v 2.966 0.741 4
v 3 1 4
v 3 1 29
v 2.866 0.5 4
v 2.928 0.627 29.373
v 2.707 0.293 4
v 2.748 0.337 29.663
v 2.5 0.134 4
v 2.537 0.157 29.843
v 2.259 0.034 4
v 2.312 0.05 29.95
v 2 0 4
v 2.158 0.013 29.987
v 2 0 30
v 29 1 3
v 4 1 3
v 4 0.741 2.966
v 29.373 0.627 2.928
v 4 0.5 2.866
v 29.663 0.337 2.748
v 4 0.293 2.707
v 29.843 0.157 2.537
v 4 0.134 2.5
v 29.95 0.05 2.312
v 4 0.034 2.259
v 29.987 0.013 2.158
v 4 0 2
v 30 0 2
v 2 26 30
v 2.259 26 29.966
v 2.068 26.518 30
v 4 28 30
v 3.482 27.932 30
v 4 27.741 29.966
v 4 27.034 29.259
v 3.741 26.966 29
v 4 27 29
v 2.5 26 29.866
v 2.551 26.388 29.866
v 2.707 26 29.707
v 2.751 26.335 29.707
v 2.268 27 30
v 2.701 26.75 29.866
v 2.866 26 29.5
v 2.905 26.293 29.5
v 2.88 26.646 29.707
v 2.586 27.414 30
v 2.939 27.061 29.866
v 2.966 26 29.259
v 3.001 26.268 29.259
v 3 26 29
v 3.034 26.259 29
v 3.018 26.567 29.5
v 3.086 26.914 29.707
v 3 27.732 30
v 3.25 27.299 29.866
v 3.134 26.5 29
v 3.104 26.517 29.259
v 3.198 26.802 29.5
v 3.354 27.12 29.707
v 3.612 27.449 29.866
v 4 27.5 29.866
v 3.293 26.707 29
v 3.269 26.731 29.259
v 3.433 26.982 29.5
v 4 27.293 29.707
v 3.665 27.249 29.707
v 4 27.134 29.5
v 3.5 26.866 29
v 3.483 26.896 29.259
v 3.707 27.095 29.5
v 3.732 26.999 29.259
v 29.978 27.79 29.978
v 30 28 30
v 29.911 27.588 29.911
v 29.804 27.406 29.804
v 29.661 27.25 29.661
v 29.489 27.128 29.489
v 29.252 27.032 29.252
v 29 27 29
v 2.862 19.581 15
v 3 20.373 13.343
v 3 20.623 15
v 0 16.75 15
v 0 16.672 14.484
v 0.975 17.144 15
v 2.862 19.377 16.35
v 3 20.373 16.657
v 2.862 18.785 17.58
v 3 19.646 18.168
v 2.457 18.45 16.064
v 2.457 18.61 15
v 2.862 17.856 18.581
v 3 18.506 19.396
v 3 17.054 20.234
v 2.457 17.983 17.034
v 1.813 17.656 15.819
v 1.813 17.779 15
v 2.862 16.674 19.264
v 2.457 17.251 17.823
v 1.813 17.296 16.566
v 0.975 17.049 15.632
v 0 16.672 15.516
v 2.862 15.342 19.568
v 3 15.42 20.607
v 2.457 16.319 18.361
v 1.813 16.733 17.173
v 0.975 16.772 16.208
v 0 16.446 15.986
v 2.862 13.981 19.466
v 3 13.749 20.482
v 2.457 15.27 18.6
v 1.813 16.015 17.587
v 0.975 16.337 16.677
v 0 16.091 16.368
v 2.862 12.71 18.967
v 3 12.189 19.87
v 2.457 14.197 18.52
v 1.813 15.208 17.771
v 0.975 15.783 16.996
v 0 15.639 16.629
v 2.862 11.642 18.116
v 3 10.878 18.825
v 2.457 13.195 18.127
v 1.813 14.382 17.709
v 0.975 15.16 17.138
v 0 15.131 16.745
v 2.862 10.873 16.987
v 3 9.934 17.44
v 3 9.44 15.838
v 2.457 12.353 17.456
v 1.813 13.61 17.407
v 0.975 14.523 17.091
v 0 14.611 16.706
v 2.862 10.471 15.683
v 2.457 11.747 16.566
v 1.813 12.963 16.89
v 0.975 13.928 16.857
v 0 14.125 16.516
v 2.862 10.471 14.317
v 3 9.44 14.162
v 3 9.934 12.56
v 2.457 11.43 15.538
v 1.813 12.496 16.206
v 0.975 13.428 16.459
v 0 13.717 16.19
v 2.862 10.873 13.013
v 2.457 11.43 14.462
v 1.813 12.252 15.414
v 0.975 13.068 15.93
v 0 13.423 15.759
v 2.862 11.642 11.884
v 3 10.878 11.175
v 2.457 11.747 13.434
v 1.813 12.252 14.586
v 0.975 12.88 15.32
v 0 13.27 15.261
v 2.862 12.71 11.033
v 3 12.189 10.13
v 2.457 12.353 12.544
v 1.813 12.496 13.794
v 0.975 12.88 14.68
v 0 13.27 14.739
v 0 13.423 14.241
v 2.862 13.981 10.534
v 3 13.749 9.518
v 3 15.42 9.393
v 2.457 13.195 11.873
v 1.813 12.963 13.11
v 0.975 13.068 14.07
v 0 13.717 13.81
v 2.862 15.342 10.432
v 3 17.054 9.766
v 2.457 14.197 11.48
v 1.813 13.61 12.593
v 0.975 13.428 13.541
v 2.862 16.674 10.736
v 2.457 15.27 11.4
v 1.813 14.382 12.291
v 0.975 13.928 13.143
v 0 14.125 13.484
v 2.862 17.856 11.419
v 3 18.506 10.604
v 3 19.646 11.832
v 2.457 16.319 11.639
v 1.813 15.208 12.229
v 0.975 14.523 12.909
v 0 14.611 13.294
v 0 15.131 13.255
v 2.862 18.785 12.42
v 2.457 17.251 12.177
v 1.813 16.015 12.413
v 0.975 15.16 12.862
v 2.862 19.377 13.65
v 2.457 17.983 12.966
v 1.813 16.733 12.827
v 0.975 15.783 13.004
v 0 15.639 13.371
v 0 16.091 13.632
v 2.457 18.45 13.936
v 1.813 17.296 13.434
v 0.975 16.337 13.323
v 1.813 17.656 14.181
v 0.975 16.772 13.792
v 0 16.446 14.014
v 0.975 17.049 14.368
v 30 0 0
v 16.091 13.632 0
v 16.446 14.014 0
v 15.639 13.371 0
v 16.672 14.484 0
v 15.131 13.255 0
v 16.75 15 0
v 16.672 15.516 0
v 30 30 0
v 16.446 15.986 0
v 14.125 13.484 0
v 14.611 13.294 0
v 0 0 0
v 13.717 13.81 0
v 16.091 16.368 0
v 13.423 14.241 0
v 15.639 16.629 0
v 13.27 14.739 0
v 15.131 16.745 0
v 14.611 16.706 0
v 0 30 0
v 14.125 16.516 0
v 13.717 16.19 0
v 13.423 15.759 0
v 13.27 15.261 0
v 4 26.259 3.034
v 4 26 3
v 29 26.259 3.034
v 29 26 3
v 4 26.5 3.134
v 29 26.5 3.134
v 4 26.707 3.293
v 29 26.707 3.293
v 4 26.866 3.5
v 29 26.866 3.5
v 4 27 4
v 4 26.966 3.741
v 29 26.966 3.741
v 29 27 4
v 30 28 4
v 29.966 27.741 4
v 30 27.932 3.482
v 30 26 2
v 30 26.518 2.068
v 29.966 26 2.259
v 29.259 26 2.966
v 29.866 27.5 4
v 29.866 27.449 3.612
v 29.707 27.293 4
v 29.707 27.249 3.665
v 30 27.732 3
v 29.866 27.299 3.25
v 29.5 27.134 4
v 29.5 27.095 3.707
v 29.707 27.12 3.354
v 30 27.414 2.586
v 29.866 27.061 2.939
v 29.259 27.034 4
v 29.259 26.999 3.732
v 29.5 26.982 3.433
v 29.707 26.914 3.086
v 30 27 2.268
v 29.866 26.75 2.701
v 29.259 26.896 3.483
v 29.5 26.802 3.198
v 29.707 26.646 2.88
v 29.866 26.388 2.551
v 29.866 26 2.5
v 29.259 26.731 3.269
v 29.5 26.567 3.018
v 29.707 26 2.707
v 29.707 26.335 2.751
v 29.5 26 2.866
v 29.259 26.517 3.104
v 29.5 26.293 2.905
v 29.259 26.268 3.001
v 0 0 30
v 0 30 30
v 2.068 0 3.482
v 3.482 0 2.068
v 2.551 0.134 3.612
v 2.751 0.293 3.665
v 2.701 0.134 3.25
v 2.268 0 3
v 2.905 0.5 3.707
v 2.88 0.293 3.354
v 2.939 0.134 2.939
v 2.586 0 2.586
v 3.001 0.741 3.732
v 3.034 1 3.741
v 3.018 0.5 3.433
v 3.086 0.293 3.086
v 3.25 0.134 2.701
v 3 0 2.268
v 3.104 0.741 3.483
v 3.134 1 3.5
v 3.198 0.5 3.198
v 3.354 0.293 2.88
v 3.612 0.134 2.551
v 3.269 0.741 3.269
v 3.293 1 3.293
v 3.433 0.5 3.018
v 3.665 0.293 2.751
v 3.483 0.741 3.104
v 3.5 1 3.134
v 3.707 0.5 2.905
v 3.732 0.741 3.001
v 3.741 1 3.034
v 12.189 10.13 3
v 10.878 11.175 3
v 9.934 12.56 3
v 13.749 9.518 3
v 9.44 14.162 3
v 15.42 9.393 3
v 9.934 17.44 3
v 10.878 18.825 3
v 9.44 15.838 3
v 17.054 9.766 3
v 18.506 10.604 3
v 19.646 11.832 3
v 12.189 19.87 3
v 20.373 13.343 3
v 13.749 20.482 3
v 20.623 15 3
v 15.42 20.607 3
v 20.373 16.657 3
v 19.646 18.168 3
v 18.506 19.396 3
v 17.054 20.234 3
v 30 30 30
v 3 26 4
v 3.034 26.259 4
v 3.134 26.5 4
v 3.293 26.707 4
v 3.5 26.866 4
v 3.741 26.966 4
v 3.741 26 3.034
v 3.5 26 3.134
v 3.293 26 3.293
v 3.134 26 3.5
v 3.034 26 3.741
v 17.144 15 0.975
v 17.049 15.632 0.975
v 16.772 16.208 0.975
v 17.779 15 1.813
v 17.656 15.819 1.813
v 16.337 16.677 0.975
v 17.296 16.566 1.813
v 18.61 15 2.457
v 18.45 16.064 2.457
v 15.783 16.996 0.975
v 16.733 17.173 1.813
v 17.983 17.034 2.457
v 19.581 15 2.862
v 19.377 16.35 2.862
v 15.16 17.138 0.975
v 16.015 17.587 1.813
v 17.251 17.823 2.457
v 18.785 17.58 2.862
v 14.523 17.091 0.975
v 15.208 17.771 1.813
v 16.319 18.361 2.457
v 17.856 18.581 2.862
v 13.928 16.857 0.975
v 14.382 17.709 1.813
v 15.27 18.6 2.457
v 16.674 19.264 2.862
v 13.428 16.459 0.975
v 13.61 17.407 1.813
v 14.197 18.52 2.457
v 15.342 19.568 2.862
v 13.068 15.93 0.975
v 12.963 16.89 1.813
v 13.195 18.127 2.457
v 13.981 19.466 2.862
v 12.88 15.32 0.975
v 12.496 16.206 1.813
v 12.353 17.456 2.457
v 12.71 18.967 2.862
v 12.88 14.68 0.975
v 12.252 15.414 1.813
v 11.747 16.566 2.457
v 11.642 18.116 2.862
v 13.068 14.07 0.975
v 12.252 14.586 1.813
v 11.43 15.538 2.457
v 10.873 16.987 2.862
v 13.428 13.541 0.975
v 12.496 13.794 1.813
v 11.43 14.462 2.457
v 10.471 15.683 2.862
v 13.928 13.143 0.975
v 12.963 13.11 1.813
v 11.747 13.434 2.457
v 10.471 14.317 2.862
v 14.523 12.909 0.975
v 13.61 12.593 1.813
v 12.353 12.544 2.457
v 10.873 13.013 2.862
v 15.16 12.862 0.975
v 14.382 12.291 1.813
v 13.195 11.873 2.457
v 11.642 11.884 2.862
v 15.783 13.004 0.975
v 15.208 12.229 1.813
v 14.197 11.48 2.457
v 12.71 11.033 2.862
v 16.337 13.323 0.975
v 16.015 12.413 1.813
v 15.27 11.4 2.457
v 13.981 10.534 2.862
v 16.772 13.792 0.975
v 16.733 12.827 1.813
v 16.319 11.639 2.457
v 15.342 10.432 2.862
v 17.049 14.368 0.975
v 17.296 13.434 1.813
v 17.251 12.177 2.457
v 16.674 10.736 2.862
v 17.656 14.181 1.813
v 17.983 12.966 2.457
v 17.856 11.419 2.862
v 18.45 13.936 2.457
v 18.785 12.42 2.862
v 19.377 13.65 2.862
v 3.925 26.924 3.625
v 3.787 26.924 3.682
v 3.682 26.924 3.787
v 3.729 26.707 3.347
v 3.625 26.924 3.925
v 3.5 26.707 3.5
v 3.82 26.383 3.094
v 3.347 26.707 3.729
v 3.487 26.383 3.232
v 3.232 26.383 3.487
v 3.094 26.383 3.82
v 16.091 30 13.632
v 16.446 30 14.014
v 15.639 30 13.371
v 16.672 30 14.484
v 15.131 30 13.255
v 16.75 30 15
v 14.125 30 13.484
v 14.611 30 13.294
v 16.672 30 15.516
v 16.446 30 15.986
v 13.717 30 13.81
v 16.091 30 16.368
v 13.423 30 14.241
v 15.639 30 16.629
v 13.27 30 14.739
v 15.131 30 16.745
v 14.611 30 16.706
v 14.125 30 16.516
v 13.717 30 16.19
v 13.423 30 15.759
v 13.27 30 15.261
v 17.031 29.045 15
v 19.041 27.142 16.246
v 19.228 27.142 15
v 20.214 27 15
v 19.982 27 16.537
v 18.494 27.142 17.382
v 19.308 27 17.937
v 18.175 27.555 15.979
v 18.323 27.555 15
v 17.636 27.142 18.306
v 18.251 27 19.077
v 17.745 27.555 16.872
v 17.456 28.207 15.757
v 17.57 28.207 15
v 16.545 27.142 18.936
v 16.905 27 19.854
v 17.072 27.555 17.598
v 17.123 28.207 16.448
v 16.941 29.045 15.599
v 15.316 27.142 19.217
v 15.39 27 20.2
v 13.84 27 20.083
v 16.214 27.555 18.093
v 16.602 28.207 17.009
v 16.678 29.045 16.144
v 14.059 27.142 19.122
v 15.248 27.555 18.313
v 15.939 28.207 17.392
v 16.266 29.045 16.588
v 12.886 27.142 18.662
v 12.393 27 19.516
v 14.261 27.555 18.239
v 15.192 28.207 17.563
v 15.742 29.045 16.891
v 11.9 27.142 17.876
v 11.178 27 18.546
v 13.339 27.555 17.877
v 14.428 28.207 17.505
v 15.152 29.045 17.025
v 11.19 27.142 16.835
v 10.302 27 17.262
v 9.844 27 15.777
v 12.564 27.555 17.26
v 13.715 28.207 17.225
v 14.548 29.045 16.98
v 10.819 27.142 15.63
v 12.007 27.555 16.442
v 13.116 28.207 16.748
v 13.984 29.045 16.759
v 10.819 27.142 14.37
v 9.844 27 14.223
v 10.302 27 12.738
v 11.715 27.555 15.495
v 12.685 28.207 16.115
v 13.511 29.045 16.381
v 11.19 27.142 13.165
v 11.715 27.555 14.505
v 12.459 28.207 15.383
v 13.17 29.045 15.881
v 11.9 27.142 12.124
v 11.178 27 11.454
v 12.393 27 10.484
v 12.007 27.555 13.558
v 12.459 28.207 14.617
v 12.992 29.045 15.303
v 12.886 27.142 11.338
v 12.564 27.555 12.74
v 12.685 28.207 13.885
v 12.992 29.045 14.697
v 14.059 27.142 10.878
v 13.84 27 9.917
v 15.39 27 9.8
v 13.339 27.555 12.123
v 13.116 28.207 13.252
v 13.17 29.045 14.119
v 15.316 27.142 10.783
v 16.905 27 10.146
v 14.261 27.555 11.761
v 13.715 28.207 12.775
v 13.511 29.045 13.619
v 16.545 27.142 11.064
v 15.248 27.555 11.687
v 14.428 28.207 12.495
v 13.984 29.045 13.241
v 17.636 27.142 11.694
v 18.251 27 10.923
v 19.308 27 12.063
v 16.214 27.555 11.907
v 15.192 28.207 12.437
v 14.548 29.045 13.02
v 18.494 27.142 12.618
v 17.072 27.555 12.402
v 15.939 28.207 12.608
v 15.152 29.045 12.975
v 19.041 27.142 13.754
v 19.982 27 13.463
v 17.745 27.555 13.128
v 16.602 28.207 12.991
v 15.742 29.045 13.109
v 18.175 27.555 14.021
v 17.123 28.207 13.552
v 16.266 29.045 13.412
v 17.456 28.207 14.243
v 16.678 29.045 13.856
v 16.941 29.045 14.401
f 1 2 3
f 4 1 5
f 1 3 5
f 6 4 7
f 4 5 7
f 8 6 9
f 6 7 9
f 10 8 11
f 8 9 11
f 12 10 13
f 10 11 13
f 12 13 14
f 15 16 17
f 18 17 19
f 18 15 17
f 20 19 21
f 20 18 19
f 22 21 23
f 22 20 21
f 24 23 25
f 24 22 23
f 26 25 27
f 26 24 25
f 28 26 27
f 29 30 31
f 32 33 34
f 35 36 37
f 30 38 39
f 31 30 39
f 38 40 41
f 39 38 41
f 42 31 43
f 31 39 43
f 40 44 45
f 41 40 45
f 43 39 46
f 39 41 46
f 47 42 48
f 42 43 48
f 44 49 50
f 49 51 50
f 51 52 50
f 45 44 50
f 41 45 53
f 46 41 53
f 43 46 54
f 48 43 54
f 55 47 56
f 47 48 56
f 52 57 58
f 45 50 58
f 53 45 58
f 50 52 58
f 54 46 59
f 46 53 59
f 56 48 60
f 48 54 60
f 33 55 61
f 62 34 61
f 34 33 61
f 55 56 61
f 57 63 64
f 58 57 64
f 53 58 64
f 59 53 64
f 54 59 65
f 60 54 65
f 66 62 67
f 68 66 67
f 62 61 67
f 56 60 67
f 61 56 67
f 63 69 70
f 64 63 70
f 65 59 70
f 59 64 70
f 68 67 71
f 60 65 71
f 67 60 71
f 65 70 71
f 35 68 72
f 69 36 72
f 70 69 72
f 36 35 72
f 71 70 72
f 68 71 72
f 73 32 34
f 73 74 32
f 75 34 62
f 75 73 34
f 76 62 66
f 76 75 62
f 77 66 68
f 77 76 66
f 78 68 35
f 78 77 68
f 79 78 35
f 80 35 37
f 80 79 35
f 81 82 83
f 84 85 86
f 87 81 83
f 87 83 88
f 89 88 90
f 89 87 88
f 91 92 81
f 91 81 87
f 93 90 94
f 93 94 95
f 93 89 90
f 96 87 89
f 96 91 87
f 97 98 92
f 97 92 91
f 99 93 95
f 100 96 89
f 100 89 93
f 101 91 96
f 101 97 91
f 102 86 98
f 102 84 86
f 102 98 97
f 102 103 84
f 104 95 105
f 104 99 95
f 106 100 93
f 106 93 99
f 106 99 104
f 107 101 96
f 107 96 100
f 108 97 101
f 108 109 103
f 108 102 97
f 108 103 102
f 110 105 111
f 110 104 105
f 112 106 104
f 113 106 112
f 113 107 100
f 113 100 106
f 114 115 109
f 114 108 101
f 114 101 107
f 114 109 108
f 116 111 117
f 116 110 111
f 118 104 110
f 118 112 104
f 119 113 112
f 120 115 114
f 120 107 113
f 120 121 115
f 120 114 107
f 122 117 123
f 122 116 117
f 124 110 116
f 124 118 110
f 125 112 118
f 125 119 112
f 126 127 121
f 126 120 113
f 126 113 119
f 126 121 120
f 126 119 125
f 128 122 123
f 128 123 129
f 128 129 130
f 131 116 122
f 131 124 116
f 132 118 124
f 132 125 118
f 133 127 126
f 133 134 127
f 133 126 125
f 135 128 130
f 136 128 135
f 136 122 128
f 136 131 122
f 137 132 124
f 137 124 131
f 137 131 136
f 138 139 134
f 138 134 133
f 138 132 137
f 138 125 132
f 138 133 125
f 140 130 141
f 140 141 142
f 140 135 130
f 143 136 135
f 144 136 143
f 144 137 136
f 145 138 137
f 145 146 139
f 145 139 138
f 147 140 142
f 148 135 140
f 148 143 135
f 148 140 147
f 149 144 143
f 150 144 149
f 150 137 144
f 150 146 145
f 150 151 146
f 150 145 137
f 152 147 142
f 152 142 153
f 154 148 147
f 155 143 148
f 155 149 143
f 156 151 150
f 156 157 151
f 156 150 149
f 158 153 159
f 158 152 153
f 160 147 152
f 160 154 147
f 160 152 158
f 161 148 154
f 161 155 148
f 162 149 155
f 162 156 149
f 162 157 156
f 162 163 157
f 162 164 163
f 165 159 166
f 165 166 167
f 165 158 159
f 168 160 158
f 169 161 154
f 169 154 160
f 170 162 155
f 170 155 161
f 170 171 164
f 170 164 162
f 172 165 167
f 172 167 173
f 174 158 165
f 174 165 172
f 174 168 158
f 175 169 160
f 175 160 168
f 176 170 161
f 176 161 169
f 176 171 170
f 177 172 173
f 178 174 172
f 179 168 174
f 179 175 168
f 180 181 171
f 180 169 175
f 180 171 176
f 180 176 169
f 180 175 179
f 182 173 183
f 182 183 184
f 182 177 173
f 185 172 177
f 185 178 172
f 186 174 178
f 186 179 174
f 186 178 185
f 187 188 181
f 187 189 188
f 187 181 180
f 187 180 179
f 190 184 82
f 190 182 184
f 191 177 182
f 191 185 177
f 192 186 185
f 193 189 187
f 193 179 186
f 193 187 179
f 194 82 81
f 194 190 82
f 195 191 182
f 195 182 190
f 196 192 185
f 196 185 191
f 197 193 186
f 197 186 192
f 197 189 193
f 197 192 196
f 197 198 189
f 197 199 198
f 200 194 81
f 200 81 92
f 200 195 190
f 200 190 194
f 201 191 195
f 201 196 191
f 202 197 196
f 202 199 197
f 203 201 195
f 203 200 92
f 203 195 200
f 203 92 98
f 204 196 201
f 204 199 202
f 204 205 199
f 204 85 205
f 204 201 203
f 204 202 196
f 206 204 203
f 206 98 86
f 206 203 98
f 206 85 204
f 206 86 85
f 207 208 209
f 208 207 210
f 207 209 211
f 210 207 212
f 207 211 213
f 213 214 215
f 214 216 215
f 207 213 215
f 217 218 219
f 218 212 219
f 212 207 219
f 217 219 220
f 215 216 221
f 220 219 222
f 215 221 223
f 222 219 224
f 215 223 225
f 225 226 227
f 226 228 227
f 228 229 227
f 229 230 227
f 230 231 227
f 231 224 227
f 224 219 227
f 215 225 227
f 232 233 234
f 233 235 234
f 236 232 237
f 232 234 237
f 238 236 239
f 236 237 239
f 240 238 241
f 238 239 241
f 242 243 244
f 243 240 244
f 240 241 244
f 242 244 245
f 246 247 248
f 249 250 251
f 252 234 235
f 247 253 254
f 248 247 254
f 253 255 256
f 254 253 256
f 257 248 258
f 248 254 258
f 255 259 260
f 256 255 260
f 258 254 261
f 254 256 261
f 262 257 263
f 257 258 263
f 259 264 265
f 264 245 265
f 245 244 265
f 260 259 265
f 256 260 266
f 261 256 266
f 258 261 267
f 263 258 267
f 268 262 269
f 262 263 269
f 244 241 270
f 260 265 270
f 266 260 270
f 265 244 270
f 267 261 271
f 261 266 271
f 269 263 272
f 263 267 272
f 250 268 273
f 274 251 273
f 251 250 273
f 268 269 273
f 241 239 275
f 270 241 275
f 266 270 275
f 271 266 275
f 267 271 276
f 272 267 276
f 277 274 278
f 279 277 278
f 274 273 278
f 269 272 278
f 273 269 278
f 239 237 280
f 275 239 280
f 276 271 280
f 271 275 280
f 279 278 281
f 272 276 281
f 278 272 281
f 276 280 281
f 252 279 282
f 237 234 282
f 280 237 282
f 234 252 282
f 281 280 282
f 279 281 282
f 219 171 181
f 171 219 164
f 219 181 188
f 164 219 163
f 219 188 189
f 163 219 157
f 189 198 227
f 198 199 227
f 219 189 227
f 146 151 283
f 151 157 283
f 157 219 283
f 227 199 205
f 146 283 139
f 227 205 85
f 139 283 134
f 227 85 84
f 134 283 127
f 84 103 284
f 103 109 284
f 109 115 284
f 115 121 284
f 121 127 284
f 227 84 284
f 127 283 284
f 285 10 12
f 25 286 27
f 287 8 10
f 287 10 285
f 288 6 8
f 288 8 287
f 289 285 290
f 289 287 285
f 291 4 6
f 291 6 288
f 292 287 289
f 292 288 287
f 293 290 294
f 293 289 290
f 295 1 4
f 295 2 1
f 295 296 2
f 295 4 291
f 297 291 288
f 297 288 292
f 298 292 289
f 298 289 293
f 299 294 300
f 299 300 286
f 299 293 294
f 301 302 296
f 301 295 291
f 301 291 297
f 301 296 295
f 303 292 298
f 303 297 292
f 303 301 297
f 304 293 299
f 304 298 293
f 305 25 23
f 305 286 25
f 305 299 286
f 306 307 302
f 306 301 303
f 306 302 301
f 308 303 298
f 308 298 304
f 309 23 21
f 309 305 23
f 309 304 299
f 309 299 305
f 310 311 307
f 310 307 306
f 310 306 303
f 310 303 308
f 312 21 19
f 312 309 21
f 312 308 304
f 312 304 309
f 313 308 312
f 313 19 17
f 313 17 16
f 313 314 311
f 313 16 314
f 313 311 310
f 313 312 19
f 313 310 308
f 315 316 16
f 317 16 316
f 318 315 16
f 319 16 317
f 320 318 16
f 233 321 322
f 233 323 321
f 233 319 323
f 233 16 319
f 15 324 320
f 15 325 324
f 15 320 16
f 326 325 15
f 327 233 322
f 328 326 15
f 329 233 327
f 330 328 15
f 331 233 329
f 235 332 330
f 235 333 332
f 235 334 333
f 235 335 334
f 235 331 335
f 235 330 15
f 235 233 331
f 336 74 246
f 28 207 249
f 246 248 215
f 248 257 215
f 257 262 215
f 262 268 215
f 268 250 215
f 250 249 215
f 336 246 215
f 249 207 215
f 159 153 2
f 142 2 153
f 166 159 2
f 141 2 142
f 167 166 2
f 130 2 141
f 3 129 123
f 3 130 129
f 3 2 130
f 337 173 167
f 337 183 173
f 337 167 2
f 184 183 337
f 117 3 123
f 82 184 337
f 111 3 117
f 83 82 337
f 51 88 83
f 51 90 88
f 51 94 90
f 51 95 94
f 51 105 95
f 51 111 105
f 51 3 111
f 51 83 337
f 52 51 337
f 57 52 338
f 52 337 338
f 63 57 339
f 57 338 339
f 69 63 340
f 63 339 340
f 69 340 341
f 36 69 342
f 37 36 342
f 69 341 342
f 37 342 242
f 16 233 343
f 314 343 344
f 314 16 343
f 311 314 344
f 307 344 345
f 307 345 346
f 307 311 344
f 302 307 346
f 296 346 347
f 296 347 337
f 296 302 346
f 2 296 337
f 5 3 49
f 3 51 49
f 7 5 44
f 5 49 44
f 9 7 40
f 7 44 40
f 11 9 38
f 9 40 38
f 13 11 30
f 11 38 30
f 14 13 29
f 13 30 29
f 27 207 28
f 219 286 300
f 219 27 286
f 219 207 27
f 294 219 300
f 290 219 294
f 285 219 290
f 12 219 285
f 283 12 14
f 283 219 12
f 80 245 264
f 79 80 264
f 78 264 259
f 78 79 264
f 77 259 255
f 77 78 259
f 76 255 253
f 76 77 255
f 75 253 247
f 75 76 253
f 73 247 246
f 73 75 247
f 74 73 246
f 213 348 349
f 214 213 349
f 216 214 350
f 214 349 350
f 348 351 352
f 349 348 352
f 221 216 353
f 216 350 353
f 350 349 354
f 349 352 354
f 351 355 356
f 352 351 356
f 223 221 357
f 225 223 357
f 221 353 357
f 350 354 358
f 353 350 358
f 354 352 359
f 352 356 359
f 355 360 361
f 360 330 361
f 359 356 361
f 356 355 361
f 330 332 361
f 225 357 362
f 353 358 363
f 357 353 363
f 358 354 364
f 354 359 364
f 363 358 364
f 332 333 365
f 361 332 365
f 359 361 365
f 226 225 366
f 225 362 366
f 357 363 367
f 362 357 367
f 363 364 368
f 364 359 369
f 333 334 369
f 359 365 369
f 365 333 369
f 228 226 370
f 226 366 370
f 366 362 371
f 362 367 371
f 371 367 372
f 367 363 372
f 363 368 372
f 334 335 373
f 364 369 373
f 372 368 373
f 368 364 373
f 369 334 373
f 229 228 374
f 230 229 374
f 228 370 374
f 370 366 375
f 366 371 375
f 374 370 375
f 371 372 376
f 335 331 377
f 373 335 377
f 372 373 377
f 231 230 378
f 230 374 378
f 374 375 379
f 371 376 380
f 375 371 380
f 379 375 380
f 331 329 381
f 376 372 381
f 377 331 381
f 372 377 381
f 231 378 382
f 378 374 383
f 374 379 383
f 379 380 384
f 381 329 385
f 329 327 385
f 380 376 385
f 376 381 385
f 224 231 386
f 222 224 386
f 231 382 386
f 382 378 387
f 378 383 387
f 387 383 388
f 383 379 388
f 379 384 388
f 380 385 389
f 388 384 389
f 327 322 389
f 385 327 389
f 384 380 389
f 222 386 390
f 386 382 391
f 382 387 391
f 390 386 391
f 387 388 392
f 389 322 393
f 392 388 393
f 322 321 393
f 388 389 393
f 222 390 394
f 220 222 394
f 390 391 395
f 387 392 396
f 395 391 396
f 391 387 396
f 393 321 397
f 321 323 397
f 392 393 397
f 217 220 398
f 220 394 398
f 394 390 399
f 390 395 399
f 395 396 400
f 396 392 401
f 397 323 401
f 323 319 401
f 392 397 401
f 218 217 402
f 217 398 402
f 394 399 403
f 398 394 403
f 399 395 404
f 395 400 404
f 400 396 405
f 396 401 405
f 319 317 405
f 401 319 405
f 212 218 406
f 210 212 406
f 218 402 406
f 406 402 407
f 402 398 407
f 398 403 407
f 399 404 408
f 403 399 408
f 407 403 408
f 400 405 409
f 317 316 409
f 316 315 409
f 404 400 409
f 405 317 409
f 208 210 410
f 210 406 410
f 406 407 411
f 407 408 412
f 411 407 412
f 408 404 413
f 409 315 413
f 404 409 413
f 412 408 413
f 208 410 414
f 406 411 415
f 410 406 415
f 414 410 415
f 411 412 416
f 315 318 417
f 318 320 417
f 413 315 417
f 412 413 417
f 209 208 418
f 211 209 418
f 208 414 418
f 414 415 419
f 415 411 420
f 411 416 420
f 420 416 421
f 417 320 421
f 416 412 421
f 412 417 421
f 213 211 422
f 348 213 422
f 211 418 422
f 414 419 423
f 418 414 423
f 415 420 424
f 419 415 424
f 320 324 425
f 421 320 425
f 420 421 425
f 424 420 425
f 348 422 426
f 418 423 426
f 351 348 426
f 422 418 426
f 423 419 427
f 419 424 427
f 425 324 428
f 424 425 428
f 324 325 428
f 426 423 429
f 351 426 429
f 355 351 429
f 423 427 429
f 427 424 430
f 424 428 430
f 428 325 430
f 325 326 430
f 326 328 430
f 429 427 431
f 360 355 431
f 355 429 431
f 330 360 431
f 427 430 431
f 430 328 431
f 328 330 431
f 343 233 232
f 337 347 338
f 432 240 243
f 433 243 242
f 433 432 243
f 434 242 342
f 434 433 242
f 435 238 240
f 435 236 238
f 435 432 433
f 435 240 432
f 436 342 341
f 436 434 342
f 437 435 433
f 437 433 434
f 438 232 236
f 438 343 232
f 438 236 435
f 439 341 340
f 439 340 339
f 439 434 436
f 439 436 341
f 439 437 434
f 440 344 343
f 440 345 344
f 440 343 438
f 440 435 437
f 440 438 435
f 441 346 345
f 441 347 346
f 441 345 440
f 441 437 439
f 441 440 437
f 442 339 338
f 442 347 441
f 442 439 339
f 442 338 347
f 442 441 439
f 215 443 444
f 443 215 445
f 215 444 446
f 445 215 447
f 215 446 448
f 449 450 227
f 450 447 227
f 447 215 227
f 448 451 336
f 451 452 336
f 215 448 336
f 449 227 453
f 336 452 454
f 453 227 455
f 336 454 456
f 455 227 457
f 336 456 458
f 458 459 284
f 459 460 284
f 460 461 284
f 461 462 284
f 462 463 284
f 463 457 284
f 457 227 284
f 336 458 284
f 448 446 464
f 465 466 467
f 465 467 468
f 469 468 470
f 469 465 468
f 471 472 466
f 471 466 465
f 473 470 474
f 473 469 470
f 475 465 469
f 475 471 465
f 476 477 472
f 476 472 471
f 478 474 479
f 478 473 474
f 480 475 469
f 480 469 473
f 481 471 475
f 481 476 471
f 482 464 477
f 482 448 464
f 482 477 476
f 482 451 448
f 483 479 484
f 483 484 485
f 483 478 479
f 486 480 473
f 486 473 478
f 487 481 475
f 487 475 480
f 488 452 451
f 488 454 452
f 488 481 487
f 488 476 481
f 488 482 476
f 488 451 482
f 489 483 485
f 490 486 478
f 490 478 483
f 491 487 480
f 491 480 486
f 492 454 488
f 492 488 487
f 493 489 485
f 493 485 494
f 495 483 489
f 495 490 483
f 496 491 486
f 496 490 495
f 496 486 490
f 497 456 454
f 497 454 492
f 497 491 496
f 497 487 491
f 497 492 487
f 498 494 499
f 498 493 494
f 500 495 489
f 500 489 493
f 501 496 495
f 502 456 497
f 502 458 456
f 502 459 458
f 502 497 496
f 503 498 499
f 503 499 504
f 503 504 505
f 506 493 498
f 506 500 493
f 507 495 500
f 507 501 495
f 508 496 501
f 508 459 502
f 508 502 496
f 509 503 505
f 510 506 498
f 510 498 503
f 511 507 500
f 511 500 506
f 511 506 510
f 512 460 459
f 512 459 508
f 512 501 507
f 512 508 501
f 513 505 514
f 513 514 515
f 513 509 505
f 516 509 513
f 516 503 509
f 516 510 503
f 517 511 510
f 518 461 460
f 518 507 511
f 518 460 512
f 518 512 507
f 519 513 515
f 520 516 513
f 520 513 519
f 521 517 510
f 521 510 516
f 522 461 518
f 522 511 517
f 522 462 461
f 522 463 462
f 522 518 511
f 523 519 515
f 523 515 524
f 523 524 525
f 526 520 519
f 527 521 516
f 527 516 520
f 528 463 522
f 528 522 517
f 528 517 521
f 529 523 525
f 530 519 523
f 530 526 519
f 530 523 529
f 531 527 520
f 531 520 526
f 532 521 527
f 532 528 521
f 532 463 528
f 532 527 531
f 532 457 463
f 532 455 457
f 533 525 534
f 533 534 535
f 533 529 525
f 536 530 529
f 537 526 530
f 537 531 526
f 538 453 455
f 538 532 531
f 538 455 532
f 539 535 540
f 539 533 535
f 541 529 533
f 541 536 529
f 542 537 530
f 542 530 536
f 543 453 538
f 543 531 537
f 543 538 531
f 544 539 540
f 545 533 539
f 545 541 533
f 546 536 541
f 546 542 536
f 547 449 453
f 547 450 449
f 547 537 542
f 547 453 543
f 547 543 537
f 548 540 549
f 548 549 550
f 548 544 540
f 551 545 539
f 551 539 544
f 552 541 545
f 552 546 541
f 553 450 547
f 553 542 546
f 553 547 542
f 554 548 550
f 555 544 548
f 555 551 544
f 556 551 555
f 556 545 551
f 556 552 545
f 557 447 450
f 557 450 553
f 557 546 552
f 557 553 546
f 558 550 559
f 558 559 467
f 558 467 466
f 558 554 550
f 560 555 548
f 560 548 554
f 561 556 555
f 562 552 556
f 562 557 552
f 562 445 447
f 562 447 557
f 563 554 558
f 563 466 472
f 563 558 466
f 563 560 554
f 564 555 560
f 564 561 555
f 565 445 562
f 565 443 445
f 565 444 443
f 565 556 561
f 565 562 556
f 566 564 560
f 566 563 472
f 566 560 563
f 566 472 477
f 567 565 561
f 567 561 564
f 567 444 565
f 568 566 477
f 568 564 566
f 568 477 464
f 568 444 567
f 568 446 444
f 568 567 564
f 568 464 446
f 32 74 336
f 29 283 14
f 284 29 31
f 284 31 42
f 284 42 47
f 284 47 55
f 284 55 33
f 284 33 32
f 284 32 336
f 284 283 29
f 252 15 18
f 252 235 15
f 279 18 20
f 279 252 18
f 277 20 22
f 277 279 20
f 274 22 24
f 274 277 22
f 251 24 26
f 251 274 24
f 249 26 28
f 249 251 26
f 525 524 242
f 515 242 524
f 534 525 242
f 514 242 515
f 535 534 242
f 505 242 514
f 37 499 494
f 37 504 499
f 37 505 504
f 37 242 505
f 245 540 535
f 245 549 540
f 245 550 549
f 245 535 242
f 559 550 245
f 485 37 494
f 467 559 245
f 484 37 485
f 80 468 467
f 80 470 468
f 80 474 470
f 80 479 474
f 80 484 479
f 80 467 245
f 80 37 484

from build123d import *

# Parameters (mm, degrees)
F1_W     = 30
F1_H     = 30
F1_R     = 1.75
F2_DEPTH = 3
F0_W     = 30
F0_H     = 30
F0_R     = 1.75
F3_DEPTH = 3
F5_W     = 30
F5_H     = 30
F5_R     = 1.75
F6_DEPTH = 3
F7_R     = 1


# Not quite as in the source:
# - a fillet or chamfer that OpenCascade refuses, or shapes differently, is made with other operations: its cross-section is extruded or revolved along the edge and cut away or added


with BuildPart() as f2:
    # F1 (on Right) → F2 (new body)
    with BuildSketch(Plane.YZ):
        with Locations((15, 15)):
            Rectangle(F1_W, F1_H)
        with Locations((15, 15)):
            Circle(F1_R, mode=Mode.SUBTRACT)
    extrude(amount=F2_DEPTH)

    # F0 (on Top) → F3 (join)
    with BuildSketch(Plane.XY):
        with Locations((15, 15)):
            Rectangle(F0_W, F0_H)
        with Locations((15, 15)):
            Circle(F0_R, mode=Mode.SUBTRACT)
    extrude(amount=F3_DEPTH)

    # F5 (on face) → F6 (join)
    with BuildSketch(Plane.XZ.offset(-30)):
        with Locations((15, 15)):
            Rectangle(F5_W, F5_H)
        with Locations((15, 15)):
            Circle(F5_R, mode=Mode.SUBTRACT)
    extrude(amount=F6_DEPTH)

    # F7
    f7_edges = [f2.edges().sort_by_distance(p)[0] for p in [
        (3, 13.5, 3),
        (3, 13.5, 30),
        (30, 13.5, 3),
        (3, 0, 16.5),
        (16.5, 0, 3),
        (16.5, 27, 3),
        (16.5, 27, 30),
        (3, 27, 16.5),
        (30, 27, 16.5),
    ]]
    fillet(f7_edges, radius=F7_R)

    # F8: fillet of radius 4 on 1 edges, made by hand

    # F8_s1 → F8_t2 (revolve, cut)
    with BuildSketch(Plane.XZ.offset(-15)):
        with BuildLine():
            ThreePointArc((16.75, 0), (18.1734936034, 2.1622776602), (20.6229833462, 3))
            Line((20.6229833462, 3), (16.75, 3))
            Line((16.75, 3), (16.75, 0))
        make_face()
    revolve(axis=Axis((15, 15, 3), (0, 0, 1)), mode=Mode.SUBTRACT)

    # F9: fillet of radius 4 on 1 edges, made by hand

    # F9_s1 → F9_t2 (revolve, cut)
    with BuildSketch(Plane.XY.offset(15)):
        with BuildLine():
            ThreePointArc((3, 20.6229833462), (2.1622776602, 18.1734936034), (0, 16.75))
            Line((0, 16.75), (3, 16.75))
            Line((3, 16.75), (3, 20.6229833462))
        make_face()
    revolve(axis=Axis((3, 15, 15), (1, 0, 0)), mode=Mode.SUBTRACT)

    # F10: fillet of radius 3.5 on 1 edges, made by hand

    # F10_s1 → F10_t2 (revolve, cut)
    with BuildSketch(Plane.XY.offset(15)):
        with BuildLine():
            ThreePointArc((20.2141016151, 27), (17.9228137677, 27.8542486889), (16.75, 30))
            Line((16.75, 30), (16.75, 27))
            Line((16.75, 27), (20.2141016151, 27))
        make_face()
    revolve(axis=Axis((15, 27, 15), (0, -1, 0)), mode=Mode.SUBTRACT)


solid = f2.part
